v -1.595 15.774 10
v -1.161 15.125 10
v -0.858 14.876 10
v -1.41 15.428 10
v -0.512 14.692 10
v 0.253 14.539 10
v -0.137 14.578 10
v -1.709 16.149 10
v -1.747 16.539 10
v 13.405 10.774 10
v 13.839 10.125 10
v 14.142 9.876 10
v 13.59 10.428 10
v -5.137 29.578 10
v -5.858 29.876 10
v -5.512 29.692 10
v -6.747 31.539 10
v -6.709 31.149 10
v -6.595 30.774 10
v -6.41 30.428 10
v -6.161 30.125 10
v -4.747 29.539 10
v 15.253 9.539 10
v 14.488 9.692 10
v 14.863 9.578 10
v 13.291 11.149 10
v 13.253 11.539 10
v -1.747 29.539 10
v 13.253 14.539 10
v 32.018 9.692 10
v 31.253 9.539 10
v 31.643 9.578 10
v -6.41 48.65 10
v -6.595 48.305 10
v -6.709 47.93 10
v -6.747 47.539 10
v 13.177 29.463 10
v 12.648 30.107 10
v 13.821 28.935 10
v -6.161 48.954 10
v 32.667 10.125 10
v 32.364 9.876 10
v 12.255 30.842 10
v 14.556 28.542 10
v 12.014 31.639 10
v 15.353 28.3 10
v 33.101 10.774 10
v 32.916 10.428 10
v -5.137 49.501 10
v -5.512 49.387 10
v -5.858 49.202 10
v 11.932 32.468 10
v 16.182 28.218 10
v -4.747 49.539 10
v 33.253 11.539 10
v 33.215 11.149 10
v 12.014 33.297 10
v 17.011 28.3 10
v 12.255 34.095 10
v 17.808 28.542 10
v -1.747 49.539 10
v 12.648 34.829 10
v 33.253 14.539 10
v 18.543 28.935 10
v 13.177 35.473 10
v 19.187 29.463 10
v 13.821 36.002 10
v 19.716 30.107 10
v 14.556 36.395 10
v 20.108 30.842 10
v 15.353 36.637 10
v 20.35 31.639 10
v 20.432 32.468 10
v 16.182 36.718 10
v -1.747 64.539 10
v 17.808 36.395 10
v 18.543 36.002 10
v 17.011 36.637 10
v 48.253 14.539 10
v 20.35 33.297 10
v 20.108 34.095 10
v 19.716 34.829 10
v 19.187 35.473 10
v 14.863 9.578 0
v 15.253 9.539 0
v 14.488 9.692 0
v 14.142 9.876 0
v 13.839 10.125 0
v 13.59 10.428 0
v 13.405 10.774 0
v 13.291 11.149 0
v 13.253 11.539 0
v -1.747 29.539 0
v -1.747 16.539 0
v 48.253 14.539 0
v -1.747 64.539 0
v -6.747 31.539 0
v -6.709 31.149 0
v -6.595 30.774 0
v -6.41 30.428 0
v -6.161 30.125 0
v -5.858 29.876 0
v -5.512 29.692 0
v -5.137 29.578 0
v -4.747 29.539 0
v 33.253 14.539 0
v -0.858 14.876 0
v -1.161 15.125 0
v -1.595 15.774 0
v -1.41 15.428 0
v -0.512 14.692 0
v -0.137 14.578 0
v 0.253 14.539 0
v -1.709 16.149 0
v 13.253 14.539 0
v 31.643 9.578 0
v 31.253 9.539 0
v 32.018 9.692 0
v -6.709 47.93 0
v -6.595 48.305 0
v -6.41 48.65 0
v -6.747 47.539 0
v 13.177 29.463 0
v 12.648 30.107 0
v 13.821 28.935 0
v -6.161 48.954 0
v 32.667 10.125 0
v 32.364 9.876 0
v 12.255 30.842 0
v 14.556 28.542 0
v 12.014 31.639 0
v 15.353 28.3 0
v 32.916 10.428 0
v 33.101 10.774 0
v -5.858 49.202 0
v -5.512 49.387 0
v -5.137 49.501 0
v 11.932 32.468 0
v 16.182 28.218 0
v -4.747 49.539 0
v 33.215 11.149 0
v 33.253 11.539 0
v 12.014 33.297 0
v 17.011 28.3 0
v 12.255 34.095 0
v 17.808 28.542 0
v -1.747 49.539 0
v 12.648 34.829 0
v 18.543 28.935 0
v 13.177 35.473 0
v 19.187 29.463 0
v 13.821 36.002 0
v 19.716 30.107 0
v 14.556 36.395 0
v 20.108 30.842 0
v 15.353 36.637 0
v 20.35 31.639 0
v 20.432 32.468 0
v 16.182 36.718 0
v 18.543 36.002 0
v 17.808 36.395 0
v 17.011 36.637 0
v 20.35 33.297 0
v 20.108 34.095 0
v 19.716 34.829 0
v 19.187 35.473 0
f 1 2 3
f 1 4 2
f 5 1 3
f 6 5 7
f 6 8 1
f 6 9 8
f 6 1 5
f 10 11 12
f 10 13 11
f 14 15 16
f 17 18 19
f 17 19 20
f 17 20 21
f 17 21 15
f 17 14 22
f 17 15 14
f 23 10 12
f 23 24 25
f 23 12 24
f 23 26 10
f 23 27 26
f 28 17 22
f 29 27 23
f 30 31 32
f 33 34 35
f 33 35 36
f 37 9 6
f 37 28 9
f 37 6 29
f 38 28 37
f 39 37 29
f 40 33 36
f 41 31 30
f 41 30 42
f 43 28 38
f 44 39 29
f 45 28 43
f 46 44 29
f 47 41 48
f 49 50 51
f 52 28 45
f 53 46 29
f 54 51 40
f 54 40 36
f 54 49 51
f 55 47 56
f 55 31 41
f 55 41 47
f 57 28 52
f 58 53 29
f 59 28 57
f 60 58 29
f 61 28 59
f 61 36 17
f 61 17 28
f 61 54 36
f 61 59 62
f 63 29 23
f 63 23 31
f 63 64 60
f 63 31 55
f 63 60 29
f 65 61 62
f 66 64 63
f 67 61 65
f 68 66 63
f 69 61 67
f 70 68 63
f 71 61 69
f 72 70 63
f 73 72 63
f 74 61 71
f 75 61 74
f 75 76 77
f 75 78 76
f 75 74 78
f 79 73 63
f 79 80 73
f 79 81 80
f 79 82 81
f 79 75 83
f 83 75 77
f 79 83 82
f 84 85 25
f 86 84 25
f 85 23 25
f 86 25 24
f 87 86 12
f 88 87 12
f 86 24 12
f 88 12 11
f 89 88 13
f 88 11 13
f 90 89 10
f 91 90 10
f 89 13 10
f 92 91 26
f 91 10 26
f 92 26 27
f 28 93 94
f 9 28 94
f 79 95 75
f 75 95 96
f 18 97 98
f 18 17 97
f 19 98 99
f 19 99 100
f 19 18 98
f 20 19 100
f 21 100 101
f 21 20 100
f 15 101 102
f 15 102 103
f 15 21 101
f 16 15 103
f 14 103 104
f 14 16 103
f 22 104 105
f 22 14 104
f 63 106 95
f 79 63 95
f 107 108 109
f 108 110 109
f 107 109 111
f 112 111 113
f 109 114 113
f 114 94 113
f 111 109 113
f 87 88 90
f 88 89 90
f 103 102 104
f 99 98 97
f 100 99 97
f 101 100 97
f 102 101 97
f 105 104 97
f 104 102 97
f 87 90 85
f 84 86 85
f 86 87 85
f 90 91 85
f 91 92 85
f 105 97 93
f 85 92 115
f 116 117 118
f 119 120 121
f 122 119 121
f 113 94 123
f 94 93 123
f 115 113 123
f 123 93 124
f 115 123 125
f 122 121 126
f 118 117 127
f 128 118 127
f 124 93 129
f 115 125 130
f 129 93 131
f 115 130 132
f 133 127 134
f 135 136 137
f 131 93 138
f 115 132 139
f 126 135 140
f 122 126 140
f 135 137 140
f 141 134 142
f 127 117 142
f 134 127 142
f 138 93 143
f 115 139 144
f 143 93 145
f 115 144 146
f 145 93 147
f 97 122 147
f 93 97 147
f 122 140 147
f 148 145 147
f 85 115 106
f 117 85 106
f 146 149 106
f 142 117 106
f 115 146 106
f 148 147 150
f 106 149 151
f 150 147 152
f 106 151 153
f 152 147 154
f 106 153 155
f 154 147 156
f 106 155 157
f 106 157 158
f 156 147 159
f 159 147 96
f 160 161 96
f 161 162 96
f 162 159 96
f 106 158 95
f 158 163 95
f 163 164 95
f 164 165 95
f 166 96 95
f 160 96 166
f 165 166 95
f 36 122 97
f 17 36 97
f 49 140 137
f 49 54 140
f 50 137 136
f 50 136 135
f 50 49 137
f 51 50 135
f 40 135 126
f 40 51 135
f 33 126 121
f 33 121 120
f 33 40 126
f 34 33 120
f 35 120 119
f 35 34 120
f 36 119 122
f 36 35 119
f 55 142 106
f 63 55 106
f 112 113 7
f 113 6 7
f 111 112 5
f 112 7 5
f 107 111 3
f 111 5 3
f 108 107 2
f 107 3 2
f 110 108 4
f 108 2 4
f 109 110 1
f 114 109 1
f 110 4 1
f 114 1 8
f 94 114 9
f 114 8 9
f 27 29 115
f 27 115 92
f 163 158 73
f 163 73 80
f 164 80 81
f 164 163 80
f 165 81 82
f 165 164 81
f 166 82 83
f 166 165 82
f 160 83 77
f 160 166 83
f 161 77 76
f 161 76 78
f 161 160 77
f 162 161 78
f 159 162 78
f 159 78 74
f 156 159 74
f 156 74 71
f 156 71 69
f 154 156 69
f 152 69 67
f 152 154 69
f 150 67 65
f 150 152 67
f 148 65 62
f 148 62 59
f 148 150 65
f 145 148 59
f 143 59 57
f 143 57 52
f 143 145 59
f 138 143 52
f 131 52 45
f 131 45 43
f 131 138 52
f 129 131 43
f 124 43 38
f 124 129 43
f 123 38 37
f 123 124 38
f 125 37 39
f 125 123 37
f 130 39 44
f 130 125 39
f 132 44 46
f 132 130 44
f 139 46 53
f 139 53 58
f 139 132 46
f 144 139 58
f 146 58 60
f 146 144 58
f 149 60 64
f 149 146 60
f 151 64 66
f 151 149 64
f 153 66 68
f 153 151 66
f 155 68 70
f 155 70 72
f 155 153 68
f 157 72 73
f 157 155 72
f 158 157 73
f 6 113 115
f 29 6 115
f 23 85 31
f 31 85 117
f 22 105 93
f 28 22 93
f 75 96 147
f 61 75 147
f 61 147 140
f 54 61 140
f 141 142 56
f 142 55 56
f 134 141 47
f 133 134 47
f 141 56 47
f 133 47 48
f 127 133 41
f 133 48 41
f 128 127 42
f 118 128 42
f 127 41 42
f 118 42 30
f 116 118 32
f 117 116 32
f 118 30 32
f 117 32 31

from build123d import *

# Parameters (mm, degrees)
SKETCH1_R           = 4.25
BOSS_EXTRUDE1_DEPTH = 10
FILLET1_R           = 2


with BuildPart() as part:
    # Sketch1 → Boss-Extrude1 (new body)
    with BuildSketch(Plane.XY):
        Polygon((48.252973088, 14.539348583), (-1.747026912, 64.539348583), (-1.747026912, 49.539348583), (-6.747026912, 49.539348583), (-6.747026912, 29.539348583), (-1.747026912, 29.539348583), (-1.747026912, 14.539348583), (13.252973088, 14.539348583), (13.252973088, 9.539348583), (33.252973088, 9.539348583), (33.252973088, 14.539348583), align=None)
        with Locations((16.181905276, 32.468280771)):
            Circle(SKETCH1_R, mode=Mode.SUBTRACT)
    extrude(amount=BOSS_EXTRUDE1_DEPTH)

    # Fillet1
    fillet1_edges = [part.edges().sort_by_distance(p)[0] for p in [
        (-1.747026912, 14.539348583, 5),
        (13.252973088, 9.539348583, 5),
        (33.252973088, 9.539348583, 5),
        (-6.747026912, 49.539348583, 5),
        (-6.747026912, 29.539348583, 5),
    ]]
    fillet(fillet1_edges, radius=FILLET1_R)


solid = part.part
